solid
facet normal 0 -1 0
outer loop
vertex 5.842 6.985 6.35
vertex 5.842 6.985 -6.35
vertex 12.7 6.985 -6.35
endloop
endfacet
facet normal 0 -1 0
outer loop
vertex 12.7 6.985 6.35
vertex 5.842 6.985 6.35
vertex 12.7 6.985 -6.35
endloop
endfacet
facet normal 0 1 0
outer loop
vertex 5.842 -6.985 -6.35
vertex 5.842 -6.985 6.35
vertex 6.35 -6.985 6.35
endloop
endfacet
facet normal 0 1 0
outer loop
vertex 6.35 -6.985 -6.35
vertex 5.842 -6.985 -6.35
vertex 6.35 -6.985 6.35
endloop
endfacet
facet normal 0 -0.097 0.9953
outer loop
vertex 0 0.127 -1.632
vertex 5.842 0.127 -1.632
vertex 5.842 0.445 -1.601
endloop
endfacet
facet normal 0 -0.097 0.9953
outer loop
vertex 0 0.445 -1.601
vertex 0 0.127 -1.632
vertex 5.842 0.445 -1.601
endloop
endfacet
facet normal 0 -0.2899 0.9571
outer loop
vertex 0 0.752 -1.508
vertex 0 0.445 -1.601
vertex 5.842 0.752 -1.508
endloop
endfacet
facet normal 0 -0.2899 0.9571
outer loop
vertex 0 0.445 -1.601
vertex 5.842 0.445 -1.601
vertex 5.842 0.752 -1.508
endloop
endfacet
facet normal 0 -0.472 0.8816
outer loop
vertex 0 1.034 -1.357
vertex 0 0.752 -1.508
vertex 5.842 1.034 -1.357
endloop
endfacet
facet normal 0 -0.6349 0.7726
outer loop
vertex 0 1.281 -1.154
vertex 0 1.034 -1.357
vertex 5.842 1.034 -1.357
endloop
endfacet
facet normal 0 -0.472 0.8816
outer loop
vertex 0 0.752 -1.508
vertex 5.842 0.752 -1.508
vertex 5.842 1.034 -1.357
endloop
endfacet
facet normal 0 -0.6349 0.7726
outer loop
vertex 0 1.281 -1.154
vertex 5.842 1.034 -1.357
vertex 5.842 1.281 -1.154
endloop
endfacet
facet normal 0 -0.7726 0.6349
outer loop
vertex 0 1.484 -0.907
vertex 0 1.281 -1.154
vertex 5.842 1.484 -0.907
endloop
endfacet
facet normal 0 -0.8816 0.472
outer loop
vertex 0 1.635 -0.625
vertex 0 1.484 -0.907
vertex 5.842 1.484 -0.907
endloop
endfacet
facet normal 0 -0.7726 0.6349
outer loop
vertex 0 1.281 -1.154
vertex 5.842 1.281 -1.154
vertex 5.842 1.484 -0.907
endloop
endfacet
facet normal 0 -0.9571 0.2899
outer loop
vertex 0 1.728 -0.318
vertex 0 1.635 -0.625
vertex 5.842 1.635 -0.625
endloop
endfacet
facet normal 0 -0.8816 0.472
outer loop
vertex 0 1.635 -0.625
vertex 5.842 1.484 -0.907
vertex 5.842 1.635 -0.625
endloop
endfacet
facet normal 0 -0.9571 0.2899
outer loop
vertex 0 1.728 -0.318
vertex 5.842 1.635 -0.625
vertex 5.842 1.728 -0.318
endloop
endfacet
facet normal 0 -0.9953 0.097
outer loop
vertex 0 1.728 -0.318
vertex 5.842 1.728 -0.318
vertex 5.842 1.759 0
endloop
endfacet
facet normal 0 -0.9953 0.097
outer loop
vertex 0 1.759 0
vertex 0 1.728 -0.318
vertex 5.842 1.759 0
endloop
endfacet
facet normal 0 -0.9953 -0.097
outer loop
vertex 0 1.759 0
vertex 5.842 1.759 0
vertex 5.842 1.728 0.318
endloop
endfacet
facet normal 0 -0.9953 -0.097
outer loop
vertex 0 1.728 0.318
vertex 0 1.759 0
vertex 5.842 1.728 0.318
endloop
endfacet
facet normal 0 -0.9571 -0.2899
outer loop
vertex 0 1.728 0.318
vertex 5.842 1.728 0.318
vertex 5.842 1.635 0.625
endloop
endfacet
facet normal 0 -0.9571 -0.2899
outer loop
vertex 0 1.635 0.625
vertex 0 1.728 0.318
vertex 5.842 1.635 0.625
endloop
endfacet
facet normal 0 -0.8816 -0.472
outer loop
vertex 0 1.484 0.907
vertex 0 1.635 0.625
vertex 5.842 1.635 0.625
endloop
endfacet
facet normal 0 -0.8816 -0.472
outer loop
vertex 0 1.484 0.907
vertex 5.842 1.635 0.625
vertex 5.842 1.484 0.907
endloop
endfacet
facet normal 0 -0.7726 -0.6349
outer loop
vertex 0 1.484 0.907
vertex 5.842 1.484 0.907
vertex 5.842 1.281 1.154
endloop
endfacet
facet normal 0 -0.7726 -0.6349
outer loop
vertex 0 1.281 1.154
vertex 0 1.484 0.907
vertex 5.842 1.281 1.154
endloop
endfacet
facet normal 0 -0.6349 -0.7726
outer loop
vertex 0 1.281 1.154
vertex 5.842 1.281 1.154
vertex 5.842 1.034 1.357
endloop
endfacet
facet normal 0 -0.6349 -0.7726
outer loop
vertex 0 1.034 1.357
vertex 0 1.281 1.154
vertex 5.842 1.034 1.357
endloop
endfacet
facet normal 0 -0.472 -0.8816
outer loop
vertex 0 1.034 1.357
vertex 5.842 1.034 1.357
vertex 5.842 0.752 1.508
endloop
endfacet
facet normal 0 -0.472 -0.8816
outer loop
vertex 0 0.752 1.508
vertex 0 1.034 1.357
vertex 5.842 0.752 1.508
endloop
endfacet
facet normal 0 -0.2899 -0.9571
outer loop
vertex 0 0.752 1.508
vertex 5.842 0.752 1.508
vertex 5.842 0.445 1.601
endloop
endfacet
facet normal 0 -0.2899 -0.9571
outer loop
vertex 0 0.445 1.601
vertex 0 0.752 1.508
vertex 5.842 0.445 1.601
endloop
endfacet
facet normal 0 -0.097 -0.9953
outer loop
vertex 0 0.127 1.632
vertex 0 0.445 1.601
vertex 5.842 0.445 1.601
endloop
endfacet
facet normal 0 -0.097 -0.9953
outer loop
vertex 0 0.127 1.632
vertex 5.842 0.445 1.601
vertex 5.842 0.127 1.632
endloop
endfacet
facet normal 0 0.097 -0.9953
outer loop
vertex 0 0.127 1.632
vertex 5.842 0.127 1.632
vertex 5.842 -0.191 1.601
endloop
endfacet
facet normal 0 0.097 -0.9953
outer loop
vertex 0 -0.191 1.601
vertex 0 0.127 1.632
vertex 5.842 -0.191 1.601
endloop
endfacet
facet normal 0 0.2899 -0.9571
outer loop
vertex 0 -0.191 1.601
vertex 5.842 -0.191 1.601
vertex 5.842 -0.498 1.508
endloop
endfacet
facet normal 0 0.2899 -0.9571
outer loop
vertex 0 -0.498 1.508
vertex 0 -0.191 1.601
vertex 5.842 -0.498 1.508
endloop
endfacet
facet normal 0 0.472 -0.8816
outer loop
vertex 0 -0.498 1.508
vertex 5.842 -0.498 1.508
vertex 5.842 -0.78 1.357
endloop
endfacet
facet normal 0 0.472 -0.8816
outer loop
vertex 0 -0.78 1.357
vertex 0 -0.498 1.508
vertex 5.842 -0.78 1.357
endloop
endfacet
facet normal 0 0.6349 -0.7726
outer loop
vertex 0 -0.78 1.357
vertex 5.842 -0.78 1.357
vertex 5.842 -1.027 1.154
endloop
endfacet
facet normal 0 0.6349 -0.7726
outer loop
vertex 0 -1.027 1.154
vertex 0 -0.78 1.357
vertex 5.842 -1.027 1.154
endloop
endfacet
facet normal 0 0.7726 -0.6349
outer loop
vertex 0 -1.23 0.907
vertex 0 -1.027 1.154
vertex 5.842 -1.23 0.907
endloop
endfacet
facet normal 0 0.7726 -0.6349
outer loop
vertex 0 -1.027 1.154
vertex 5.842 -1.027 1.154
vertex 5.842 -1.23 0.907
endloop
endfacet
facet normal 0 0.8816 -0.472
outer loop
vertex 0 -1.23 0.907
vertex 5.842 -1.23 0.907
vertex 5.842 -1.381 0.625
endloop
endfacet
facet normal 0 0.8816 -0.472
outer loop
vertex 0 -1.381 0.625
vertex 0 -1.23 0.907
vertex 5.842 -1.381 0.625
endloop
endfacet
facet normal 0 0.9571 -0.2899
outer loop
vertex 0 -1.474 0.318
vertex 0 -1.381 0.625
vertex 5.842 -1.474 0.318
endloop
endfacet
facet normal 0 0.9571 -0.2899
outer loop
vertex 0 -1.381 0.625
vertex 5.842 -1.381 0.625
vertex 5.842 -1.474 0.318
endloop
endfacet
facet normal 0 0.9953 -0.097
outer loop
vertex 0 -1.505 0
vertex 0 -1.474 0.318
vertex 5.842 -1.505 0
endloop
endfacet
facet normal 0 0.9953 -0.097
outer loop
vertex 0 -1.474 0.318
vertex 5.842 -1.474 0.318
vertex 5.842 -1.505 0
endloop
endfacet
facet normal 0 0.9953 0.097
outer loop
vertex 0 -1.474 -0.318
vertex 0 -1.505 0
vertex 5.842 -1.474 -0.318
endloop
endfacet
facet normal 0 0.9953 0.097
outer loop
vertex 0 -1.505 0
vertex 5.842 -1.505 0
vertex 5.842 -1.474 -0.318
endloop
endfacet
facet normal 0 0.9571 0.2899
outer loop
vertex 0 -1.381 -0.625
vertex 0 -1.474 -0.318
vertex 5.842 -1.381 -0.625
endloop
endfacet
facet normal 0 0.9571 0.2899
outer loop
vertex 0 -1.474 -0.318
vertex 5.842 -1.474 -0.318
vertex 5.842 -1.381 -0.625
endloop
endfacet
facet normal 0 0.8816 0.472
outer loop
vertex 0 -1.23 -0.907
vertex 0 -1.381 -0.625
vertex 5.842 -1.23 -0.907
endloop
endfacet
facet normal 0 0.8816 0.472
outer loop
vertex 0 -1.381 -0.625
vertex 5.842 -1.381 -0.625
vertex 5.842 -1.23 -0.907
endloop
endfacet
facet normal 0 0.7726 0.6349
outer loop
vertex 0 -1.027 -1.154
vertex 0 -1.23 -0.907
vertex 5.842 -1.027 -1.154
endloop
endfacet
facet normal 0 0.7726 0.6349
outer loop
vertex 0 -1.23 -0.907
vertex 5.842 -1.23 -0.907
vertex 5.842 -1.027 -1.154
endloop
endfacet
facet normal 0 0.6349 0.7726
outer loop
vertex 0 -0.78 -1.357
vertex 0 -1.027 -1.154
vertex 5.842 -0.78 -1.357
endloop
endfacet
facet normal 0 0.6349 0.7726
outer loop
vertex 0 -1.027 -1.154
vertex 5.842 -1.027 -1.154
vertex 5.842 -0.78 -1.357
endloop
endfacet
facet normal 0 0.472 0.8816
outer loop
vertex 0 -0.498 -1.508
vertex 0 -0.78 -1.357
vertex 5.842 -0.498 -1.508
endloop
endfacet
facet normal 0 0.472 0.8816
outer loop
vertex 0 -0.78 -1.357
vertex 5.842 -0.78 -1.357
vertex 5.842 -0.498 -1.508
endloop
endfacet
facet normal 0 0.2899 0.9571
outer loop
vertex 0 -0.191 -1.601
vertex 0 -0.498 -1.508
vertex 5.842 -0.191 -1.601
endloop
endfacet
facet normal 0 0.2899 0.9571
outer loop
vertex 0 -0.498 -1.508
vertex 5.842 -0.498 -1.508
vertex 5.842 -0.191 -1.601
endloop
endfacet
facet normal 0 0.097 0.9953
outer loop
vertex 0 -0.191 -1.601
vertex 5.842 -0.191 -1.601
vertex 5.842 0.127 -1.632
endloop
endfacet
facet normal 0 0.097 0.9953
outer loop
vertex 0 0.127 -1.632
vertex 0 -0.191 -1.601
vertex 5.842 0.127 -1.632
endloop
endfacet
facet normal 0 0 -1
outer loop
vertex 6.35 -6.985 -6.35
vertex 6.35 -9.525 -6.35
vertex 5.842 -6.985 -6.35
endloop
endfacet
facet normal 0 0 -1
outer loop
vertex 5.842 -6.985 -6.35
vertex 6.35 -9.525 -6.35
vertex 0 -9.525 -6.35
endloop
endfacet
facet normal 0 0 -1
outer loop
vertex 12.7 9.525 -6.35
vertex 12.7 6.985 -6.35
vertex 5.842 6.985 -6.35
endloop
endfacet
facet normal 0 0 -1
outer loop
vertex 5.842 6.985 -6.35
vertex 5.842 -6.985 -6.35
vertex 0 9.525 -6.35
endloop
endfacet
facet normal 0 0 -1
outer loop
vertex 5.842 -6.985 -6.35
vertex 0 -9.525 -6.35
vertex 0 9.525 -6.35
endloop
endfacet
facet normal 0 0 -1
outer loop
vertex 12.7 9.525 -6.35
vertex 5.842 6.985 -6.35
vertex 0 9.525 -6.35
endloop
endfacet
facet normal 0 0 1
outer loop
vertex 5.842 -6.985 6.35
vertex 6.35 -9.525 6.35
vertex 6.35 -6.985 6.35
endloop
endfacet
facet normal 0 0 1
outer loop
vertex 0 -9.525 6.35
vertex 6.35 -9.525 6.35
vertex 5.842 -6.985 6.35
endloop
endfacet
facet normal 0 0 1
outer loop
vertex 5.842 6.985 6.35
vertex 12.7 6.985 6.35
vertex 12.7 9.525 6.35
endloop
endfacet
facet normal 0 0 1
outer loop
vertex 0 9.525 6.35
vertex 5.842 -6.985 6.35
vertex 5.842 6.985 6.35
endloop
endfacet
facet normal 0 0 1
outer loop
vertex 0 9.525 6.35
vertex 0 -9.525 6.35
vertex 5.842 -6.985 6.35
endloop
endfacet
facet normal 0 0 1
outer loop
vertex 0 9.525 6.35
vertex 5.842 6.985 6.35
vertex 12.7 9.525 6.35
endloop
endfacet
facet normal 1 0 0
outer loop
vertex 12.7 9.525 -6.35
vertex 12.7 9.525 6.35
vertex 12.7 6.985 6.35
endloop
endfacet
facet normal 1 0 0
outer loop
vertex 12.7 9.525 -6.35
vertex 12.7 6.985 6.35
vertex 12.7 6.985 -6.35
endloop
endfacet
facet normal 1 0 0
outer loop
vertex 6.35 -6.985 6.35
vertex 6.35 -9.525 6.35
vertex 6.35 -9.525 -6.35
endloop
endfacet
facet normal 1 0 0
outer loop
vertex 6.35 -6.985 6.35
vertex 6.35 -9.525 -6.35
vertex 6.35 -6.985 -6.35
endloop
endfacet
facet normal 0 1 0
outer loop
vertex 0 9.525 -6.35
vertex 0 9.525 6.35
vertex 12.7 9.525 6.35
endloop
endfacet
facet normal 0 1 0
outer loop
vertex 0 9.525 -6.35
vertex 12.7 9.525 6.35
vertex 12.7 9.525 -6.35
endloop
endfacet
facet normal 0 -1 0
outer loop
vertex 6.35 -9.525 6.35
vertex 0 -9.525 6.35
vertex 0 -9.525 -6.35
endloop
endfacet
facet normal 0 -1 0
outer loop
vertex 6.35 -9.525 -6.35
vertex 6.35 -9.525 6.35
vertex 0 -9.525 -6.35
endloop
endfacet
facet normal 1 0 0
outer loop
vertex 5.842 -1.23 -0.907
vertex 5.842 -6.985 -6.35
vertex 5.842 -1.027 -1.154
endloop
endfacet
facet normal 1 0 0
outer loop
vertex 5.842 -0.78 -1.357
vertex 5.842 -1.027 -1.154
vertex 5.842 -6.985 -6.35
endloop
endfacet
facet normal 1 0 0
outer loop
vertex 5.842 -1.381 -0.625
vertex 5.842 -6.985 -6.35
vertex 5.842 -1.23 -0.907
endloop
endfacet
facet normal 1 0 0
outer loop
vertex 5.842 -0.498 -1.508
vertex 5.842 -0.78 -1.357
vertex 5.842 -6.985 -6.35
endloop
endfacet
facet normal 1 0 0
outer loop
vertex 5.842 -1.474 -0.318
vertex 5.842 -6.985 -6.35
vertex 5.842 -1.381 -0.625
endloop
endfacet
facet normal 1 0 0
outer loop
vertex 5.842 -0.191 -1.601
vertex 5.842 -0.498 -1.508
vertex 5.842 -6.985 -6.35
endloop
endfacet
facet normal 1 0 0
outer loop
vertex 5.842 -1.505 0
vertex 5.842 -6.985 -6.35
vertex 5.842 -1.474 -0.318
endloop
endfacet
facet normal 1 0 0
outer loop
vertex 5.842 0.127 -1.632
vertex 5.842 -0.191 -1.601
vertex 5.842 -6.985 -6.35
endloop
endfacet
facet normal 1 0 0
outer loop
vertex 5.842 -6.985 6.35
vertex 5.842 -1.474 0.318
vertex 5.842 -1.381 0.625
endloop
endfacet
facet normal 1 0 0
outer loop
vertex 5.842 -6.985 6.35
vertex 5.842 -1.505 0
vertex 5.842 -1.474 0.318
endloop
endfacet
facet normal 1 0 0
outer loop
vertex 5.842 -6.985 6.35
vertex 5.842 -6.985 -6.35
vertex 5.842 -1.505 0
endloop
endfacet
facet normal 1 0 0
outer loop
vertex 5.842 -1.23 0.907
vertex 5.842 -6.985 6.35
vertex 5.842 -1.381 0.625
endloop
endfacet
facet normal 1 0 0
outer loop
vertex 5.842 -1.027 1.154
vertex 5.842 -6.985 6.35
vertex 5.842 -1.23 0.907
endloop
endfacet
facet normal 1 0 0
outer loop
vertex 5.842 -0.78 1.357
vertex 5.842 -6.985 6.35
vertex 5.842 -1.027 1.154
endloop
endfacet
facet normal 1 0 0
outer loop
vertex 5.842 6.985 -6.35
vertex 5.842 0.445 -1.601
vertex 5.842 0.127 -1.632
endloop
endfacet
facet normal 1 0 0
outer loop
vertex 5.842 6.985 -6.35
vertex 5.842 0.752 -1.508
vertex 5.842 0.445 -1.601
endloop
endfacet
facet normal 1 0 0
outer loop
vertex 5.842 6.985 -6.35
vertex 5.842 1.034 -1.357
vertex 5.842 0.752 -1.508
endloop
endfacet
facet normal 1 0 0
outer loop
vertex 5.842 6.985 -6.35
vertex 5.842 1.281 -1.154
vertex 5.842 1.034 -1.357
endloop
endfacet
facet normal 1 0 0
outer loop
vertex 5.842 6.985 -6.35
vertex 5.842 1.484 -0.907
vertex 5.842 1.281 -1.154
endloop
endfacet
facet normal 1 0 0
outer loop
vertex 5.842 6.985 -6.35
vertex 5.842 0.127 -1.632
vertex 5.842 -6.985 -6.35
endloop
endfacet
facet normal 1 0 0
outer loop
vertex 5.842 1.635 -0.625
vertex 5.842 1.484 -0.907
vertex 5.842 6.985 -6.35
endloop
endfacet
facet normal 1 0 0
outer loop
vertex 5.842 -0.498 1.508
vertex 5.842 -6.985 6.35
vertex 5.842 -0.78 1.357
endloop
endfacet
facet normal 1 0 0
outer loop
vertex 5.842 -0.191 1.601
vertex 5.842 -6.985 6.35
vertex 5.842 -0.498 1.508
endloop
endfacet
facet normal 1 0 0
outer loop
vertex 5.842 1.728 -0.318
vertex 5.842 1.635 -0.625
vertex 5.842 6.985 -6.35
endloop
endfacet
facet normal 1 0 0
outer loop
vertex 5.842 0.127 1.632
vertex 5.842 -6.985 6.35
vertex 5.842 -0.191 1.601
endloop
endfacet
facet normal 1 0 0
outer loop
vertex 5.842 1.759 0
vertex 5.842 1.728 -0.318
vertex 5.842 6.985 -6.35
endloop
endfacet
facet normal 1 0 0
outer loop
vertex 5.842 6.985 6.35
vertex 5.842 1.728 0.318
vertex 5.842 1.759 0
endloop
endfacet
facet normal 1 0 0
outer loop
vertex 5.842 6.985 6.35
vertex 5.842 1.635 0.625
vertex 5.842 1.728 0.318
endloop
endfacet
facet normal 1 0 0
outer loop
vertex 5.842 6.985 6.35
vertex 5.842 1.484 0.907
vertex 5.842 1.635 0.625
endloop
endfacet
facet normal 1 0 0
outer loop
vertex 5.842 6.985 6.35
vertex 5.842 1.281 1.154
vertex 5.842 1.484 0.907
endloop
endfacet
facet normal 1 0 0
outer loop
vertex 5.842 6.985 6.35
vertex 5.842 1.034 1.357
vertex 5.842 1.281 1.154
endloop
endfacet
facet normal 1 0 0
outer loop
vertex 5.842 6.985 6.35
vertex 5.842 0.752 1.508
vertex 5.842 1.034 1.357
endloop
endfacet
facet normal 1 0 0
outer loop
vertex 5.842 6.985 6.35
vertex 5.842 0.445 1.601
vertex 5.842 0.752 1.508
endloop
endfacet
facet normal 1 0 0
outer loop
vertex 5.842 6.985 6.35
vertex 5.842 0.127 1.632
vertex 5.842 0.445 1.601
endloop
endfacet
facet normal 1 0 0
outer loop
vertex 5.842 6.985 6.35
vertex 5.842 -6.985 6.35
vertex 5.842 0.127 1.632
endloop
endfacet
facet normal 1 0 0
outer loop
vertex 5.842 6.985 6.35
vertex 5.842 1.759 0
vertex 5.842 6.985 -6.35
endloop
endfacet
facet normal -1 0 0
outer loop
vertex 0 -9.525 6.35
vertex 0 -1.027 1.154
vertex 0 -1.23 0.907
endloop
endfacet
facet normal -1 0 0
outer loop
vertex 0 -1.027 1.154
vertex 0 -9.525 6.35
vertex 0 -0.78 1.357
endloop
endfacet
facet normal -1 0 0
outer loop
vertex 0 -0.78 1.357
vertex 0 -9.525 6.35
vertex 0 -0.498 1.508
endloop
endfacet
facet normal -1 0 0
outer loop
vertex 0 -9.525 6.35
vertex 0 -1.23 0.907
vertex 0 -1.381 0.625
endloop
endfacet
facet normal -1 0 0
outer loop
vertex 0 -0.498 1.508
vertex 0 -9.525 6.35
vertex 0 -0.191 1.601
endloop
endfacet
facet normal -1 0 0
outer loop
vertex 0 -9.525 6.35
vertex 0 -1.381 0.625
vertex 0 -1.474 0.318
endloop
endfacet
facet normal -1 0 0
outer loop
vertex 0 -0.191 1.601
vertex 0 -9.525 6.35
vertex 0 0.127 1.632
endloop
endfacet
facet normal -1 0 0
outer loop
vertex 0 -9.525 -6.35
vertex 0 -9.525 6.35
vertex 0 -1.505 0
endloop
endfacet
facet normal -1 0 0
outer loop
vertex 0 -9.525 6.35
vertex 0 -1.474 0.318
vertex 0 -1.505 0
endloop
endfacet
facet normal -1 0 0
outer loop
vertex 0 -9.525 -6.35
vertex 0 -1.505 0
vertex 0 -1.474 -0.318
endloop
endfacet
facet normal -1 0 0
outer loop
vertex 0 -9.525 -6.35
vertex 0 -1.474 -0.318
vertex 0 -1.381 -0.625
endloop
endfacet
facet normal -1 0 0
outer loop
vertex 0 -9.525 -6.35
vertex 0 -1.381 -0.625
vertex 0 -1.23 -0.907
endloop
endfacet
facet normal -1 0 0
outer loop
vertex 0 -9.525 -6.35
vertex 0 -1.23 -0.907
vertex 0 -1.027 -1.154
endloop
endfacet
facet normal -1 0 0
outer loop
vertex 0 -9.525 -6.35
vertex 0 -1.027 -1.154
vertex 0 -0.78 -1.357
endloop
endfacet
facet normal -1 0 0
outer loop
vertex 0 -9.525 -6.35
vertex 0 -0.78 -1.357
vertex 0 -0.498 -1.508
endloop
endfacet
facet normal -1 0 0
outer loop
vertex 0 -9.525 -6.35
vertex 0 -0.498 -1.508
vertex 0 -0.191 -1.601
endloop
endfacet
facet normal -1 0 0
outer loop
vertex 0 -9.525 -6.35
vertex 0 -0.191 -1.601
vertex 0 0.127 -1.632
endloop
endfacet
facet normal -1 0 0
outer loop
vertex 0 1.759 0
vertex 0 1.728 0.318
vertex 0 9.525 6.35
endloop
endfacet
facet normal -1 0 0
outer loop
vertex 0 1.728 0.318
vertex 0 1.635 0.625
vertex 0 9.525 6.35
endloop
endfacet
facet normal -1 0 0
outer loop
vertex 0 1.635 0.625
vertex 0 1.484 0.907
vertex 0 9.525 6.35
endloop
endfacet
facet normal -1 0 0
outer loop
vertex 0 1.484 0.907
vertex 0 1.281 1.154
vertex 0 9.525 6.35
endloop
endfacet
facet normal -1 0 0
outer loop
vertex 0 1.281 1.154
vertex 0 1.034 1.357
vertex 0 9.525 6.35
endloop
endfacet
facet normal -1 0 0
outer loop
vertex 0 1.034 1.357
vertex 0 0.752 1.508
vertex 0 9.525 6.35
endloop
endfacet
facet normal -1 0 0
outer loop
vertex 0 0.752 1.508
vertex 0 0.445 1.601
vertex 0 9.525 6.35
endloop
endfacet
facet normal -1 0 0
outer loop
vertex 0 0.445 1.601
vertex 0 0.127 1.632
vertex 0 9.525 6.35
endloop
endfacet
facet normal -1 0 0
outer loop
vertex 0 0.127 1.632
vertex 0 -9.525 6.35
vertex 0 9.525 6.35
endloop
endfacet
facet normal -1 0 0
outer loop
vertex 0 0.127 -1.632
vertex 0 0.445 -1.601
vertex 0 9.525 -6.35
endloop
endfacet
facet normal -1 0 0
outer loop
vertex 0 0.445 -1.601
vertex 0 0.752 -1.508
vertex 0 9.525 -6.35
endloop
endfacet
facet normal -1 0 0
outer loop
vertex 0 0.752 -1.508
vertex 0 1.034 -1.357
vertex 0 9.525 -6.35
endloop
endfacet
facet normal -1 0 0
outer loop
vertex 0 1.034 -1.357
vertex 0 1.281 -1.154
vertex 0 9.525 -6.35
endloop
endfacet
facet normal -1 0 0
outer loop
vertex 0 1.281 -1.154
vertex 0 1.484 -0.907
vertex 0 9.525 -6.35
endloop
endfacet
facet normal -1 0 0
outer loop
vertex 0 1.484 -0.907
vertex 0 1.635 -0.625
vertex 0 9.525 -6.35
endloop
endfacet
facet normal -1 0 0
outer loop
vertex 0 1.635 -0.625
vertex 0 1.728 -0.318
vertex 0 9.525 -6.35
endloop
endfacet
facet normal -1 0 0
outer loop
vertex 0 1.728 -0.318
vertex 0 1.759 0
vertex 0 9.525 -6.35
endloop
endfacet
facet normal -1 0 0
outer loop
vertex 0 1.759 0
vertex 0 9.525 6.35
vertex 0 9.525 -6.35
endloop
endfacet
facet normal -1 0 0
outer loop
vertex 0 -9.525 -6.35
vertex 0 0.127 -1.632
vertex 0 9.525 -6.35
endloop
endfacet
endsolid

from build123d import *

# Parameters (mm, degrees)
SKETCH1_W             = 12.7
SKETCH1_H             = 19.05
BOSS_EXTRUDE1_DEPTH   = 12.7
SKETCH2_W             = 6.35
SKETCH2_H             = 16.51
CUT_EXTRUDE1_DEPTH    = 21.329919454
SKETCH3_W             = 0.508
SKETCH3_H             = 13.97
CUT_EXTRUDE2_DEPTH    = 21.329919454
F_4_CLEARANCE_HOLE1_D = 3.2639


with BuildPart() as part:
    # Sketch1 → Boss-Extrude1 (new body)
    with BuildSketch(Plane(origin=(0, 0, 0), x_dir=(0, 0, -1), z_dir=(1, 0, 0))):
        Rectangle(SKETCH1_W, SKETCH1_H)
    extrude(amount=BOSS_EXTRUDE1_DEPTH)

    # Sketch2 → Cut-Extrude1 (cut, through all)
    with BuildSketch(Plane.XY.offset(6.35)):
        with Locations((9.525, -1.27)):
            Rectangle(SKETCH2_W, SKETCH2_H)
    extrude(amount=-CUT_EXTRUDE1_DEPTH, mode=Mode.SUBTRACT)

    # Sketch3 → Cut-Extrude2 (cut, through all)
    with BuildSketch(Plane.XY.offset(6.35)):
        with Locations((6.096, 0)):
            Rectangle(SKETCH3_W, SKETCH3_H)
    extrude(amount=-CUT_EXTRUDE2_DEPTH, mode=Mode.SUBTRACT)

    # #4 Clearance Hole1 (through all)
    with Locations(Plane.ZY):
        with Locations((0, 0.127)):
            Hole(F_4_CLEARANCE_HOLE1_D / 2)


solid = part.part
